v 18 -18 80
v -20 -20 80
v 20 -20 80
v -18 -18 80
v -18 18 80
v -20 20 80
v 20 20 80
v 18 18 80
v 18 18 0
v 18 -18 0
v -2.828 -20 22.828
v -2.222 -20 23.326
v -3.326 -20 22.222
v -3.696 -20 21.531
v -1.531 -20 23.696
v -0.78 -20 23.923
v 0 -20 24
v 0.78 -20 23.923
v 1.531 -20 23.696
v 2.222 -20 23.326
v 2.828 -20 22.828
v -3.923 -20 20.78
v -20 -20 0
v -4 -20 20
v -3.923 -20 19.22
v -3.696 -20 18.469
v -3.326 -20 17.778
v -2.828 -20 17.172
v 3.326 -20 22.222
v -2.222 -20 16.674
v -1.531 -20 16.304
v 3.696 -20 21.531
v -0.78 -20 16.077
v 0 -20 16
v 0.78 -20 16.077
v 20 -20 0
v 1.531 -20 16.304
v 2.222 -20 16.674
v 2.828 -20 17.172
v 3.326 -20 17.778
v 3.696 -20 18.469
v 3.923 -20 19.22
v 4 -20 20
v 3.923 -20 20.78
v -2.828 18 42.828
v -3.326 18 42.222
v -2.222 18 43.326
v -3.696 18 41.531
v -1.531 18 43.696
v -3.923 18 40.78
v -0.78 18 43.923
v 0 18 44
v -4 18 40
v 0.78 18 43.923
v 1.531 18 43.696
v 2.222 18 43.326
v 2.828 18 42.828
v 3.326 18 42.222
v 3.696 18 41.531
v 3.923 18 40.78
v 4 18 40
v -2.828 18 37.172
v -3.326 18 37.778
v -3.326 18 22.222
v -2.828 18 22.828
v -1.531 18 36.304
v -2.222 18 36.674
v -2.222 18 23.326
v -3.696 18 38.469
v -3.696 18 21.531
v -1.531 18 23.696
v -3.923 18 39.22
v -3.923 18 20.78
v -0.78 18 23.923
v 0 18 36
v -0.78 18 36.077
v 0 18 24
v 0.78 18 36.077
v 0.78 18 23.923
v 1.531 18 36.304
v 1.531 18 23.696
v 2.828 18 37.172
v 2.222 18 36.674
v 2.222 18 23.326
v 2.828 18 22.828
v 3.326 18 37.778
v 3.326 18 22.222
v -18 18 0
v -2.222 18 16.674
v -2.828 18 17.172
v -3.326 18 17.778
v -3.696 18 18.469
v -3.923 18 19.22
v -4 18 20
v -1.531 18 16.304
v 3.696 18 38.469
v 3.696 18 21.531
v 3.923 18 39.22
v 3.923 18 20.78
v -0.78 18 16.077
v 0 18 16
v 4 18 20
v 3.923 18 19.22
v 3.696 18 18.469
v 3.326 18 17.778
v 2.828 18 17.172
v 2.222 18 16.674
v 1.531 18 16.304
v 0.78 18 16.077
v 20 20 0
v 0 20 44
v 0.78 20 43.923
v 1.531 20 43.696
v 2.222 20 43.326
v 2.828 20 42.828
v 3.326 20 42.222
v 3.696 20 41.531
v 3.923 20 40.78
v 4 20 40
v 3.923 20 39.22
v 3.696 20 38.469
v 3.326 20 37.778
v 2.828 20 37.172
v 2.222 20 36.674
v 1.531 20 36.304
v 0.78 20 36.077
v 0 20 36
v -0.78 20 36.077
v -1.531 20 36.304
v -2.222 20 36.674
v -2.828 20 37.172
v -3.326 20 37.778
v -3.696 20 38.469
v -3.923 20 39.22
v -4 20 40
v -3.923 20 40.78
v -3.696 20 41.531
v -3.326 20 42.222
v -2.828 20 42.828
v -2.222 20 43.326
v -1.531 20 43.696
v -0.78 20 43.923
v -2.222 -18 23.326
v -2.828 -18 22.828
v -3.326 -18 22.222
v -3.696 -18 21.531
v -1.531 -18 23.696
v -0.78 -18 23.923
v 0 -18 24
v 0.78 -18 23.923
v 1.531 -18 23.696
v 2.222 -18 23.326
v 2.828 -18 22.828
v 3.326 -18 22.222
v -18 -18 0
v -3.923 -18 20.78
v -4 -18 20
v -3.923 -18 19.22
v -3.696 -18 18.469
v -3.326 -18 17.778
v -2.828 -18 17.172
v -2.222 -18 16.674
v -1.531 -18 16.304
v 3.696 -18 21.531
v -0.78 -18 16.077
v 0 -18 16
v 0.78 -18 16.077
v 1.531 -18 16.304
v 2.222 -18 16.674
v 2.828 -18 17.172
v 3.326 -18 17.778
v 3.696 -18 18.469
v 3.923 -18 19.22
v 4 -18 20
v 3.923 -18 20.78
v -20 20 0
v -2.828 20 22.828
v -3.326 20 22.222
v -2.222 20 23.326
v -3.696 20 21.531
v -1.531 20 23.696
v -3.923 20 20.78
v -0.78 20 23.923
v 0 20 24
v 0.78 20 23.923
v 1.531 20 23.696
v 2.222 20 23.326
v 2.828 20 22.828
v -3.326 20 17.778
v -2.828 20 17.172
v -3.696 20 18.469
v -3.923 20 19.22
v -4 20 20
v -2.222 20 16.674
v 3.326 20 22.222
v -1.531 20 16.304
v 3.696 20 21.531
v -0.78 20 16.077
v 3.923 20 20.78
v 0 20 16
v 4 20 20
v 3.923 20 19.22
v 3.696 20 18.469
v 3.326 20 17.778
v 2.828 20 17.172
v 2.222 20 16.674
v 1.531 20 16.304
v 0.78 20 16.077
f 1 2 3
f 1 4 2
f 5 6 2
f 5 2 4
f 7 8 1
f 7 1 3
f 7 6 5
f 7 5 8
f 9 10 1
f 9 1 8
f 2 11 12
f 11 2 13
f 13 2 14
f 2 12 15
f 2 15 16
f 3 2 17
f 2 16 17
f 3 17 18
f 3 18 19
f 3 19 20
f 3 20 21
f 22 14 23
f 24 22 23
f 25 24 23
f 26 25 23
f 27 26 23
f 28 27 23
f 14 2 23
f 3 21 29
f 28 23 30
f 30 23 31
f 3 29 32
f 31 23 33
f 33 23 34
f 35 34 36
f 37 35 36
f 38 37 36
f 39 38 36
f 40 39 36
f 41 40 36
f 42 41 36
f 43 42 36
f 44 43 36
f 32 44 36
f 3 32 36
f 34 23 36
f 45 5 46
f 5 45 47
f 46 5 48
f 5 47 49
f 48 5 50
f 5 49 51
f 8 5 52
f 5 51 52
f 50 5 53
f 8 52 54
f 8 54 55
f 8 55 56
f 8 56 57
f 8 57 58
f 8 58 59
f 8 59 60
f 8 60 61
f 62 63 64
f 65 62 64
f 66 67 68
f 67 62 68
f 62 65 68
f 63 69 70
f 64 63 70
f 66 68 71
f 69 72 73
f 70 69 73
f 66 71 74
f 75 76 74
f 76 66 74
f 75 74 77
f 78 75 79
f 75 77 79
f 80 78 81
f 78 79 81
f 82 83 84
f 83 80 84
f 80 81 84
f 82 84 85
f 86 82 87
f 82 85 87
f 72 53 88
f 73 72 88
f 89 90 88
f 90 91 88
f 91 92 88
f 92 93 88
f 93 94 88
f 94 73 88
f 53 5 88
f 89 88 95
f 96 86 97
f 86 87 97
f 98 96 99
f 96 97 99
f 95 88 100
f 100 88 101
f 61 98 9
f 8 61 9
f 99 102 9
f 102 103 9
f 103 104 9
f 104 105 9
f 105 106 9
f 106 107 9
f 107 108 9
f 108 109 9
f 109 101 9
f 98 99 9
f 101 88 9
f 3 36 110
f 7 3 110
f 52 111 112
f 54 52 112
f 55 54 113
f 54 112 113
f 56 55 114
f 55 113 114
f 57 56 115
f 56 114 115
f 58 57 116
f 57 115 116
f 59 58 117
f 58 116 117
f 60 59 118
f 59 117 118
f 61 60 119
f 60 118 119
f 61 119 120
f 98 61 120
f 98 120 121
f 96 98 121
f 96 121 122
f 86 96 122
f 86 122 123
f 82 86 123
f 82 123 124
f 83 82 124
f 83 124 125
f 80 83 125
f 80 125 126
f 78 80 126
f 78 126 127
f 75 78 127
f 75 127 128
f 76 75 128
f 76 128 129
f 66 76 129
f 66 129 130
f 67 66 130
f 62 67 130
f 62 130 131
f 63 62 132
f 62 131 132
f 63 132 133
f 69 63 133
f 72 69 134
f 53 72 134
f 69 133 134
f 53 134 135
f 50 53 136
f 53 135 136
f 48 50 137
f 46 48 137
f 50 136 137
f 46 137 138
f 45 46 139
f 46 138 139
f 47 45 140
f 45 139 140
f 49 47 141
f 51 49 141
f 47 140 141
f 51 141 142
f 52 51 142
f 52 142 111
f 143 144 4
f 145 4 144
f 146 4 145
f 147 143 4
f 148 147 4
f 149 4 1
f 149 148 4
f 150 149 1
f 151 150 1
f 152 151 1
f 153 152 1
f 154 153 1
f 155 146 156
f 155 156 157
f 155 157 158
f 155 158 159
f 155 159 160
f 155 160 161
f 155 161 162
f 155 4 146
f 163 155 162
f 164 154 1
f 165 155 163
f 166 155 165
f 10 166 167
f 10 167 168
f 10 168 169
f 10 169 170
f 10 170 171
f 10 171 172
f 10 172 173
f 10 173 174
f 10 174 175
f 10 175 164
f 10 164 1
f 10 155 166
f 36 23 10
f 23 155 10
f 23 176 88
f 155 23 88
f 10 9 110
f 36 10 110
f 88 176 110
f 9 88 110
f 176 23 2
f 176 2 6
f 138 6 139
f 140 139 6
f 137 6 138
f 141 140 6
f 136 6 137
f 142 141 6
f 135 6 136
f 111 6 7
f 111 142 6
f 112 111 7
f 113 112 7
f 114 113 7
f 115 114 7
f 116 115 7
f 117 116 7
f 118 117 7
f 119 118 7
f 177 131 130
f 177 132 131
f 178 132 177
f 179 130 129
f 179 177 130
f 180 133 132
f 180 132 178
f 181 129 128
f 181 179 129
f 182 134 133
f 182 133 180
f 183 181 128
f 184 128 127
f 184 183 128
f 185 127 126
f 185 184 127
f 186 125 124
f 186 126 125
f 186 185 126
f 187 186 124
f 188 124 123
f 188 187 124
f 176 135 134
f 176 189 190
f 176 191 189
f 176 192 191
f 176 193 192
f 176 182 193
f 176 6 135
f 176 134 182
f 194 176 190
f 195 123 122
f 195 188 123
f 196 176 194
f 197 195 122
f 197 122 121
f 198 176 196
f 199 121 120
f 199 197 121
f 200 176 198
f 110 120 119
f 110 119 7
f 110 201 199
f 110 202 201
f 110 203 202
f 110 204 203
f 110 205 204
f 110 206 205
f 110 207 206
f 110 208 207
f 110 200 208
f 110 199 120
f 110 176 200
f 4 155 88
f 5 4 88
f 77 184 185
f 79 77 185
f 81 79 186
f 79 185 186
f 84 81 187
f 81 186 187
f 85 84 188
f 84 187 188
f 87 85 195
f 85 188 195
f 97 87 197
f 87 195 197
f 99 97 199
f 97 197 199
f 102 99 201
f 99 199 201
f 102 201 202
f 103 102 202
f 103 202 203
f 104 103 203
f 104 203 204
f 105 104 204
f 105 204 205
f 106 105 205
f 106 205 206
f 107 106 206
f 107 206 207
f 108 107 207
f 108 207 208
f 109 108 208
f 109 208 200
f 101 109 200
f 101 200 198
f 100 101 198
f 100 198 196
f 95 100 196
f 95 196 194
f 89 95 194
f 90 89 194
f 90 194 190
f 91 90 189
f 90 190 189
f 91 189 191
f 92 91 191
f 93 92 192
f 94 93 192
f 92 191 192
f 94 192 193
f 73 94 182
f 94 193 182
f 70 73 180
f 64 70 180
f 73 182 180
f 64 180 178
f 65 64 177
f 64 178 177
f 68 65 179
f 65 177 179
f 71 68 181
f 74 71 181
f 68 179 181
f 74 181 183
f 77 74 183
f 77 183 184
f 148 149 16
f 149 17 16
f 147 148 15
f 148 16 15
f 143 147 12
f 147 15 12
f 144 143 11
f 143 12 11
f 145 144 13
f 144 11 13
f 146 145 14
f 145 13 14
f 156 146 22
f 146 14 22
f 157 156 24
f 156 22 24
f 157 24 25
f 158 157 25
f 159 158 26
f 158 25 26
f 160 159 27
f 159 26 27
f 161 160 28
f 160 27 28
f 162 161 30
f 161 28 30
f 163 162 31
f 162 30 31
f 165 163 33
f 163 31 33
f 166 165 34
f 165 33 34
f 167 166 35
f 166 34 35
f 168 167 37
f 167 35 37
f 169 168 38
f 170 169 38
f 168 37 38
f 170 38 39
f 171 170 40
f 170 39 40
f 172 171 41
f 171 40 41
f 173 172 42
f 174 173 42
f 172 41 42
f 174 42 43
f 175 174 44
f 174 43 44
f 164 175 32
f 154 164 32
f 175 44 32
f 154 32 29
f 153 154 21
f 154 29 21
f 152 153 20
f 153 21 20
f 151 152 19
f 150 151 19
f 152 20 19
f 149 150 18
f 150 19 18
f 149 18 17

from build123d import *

# Parameters (mm, degrees)
SKETCH1_W           = 40
SKETCH1_H           = 40
SKETCH1_W_2         = 36
SKETCH1_H_2         = 36
BOSS_EXTRUDE1_DEPTH = 80
CUT_EXTRUDE1_REACH  = 93.652
SKETCH2_R           = 4
CUT_EXTRUDE2_REACH  = 93.652
SKETCH3_R           = 4


with BuildPart() as part:
    # Sketch1 → Boss-Extrude1 (new body)
    with BuildSketch(Plane.XY):
        Rectangle(SKETCH1_W, SKETCH1_H)
        Rectangle(SKETCH1_W_2, SKETCH1_H_2, mode=Mode.SUBTRACT)
    extrude(amount=BOSS_EXTRUDE1_DEPTH)

    # Sketch2 → Cut-Extrude1 (cut, up to next)
    with BuildSketch(Plane(origin=(0, 20, 0), x_dir=(1, 0, 0), z_dir=(0, 1, 0)), mode=Mode.PRIVATE) as cut_extrude1_sk1:
        with Locations(Location((0, -20, 0), (0, 0, 270))):
            Circle(SKETCH2_R)
    cut_extrude1_tool1 = extrude(cut_extrude1_sk1.sketch, amount=-CUT_EXTRUDE1_REACH, mode=Mode.PRIVATE) & part.part
    # Sketch2 → Cut-Extrude1 (cut, up to next)
    with BuildSketch(Plane(origin=(0, 20, 0), x_dir=(1, 0, 0), z_dir=(0, 1, 0)), mode=Mode.PRIVATE) as cut_extrude1_sk2:
        with Locations(Location((0, -40, 0), (0, 0, 270))):
            Circle(SKETCH2_R)
    cut_extrude1_tool2 = extrude(cut_extrude1_sk2.sketch, amount=-CUT_EXTRUDE1_REACH, mode=Mode.PRIVATE) & part.part
    add(cut_extrude1_tool1.solids().sort_by_distance((0, 20, 20))[0], mode=Mode.SUBTRACT)
    add(cut_extrude1_tool2.solids().sort_by_distance((0, 20, 40))[0], mode=Mode.SUBTRACT)

    # Sketch3 → Cut-Extrude2 (cut, up to next)
    with BuildSketch(Plane.XZ.offset(20), mode=Mode.PRIVATE) as cut_extrude2_sk1:
        with Locations(Location((0, 20, 0), (0, 0, 90))):
            Circle(SKETCH3_R)
    cut_extrude2_tool1 = extrude(cut_extrude2_sk1.sketch, amount=-CUT_EXTRUDE2_REACH, mode=Mode.PRIVATE) & part.part
    add(cut_extrude2_tool1.solids().sort_by_distance((0, -20, 20))[0], mode=Mode.SUBTRACT)


solid = part.part
